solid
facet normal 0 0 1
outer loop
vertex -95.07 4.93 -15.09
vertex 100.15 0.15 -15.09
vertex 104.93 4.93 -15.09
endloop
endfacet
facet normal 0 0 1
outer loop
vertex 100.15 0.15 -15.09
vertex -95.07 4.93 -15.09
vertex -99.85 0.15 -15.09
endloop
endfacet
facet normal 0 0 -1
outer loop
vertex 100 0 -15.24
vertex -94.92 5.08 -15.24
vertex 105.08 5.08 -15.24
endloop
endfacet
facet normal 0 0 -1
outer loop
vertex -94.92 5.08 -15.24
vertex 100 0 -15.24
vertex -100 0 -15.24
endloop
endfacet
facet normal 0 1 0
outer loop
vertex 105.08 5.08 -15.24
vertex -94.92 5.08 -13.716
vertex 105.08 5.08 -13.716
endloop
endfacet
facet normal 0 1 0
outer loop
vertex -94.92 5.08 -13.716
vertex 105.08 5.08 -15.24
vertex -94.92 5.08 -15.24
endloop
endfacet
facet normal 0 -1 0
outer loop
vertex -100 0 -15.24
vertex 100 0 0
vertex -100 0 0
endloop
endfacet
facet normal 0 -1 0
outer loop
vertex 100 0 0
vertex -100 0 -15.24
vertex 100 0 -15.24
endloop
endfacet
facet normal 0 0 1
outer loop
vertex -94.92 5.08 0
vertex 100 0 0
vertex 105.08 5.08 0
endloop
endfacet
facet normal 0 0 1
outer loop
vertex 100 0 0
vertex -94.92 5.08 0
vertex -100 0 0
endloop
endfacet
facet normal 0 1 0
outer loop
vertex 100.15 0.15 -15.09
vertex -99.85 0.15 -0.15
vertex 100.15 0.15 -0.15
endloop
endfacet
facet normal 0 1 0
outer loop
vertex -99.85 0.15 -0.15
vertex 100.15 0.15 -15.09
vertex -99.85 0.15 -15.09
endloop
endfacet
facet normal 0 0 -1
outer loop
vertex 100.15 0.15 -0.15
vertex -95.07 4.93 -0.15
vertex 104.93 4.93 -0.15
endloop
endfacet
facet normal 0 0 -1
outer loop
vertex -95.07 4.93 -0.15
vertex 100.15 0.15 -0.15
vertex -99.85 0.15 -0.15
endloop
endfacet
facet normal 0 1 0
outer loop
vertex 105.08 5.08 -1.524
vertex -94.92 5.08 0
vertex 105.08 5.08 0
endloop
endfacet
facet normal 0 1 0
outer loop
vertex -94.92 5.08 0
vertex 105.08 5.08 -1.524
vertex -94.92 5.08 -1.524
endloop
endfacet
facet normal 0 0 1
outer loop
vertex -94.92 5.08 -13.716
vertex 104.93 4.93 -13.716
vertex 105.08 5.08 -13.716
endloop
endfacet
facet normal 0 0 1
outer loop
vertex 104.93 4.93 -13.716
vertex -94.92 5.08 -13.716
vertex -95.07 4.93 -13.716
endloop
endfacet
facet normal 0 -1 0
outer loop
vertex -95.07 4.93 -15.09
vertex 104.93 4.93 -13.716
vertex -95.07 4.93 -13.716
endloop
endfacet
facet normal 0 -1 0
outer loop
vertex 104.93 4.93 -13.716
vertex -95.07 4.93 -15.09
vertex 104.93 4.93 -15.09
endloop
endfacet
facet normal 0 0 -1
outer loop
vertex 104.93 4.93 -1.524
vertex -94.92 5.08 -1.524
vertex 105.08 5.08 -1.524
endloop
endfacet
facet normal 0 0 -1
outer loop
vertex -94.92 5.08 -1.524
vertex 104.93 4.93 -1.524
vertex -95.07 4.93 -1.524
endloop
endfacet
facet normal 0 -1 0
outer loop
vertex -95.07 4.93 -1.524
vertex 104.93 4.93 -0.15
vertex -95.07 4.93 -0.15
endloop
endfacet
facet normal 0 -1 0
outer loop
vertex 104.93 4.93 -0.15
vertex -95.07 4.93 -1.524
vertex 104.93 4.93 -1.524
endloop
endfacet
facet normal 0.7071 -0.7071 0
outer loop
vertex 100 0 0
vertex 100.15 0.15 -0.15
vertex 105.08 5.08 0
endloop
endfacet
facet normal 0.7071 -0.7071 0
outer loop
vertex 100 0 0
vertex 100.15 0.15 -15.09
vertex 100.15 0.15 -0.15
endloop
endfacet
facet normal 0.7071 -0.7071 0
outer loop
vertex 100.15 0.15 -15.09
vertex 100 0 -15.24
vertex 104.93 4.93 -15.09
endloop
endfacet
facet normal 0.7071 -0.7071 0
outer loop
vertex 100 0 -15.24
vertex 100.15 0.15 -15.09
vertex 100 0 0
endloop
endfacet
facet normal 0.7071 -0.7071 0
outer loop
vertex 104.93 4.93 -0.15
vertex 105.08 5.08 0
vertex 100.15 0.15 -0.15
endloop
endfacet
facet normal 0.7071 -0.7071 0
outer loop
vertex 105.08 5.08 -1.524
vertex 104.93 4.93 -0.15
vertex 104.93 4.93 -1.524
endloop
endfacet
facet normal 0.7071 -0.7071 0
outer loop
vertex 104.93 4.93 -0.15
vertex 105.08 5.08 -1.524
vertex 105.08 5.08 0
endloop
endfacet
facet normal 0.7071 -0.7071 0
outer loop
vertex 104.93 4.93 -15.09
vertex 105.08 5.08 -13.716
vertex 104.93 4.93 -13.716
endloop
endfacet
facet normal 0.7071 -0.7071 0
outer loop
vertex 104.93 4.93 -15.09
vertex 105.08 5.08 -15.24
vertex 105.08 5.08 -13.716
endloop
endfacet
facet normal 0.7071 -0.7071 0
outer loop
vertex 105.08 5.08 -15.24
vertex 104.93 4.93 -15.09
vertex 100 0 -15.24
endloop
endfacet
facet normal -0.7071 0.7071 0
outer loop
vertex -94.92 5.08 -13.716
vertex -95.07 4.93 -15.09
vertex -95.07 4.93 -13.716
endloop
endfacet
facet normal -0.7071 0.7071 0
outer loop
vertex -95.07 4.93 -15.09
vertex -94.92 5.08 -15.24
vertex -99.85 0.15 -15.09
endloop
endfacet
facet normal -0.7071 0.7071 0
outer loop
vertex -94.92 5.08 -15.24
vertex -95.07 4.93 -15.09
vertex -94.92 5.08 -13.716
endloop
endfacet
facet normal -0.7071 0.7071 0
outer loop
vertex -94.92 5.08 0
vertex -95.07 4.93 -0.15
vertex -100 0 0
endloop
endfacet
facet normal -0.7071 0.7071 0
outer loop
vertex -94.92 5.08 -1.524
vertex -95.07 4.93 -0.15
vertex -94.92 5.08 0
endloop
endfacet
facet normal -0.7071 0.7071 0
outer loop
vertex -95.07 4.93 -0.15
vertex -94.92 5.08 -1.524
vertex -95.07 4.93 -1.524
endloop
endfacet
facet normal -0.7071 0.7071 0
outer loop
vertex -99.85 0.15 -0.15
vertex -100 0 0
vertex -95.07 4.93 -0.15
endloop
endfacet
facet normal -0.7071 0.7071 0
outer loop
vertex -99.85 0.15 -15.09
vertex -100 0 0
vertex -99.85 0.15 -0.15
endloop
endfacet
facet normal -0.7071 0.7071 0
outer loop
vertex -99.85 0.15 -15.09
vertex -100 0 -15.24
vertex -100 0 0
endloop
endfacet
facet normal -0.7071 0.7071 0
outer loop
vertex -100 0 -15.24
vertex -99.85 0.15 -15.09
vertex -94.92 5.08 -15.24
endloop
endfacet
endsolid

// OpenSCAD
module anglebar(length=100, c = "DimGray", width=1.5*2.54, thickn=0.4) 
{
    color(c) {
        translate([0,width/2,thickn/2]) 
            cube([length, width, thickn], center = true);
        translate([0,thickn/2,width/2]) 
            cube([length, thickn, width], center = true);
    }
}

module anglebar1(length=100, c = "DimGray", thickn=0.3)
{
    anglebar(length, c, 2.54, thickn);
}

module anglebar15(length=100, c = "DimGray", thickn=0.4)
{
    anglebar(length, c, 1.5*2.54, thickn);
}

module anglebar2(length=100, c = "DimGray", thickn=0.5)
{
    anglebar(length, c, 2*2.54, thickn);
}

// Name is C-Channel, even I used C-bar.
// Channel Bar: 75mm x 50mm x 3mm, 6 m piece 1500-1700 pesos.
// Channel Bar: 75mm x 50mm x 5mm, 6 m piece 2260 pesos.
// Bigger sizes available.
module c_bar(length=100, c = "DarkGray", width=2.0*2.54, height = 3*2.54,thickn=0.5) 
{
    color(c) {
        translate([0,width/2,-height/2+thickn/2]) 
            cube([length, width, thickn], center = true);
        translate([0,thickn/2,0]) 
            cube([length, thickn, height], center = true);
        translate([0, width/2,height/2 - thickn/2]) 
            cube([length, width, thickn], center = true);
    }
}

module c_bar3(length=100, c = "DarkGray", thickn=0.5) 
{
    c_bar(length, c, 5, 7.5, thickn);
} 

// Purlin with cuts for 45 degrees and roof angle
module c_purlin_angled(
    length=100, 
    left_45 = 0, left_roof_angle = 0, 
    right_45 = 0, right_roof_angle = 0, 
    c = "Red", 
    width=2.0*2.54, height = 6*2.54,
    thickn=0.15) 
{
    add_len_left = height * tan(left_roof_angle);
    add_len_right = height * tan(right_roof_angle);
    add_len_tmp = add_len_left > add_len_right
        ? add_len_left : add_len_right;
    add_len_tmp2 = add_len_tmp < 0 ? 0 : add_len_tmp; 
    add_len = ((left_45 < 0 || right_45 < 0) 
        && add_len_tmp2 < width) 
        ? width : add_len_tmp2;
    
    box_d = height * sqrt(2);
    box_w = 4*width  + 0.2;
       
    difference()
    {
        translate([0,0,-height/2])
        c_purlin(length + 2*add_len, c, width, height, thickn);

        translate([length/2, 0, 0])
        rotate([0, -right_roof_angle, 0])
        rotate([0, 0, right_45])
        translate([box_d/2, width/2, -height/2])
        cube([box_d, box_w, box_d], center=true);

        translate([-length/2, 0, 0])
        rotate([0, left_roof_angle, 0])
        rotate([0, 0, -left_45])
        translate([-box_d/2, width/2, -height/2])
        cube([box_d, box_w, box_d], center=true);
    }
}

// C purlins come as 2"x3", 2"x4", 2"x6" and 2"x7", 
// 6m long pieces. Metric sizes also available.
// Steel thicknessess 1.2mm, 1.5mm or 2.0mm.
// 1.5mm price is good (2"x3" lists 574 pesos), 
// 1.2mm is not much cheaper and 2.0mm is expensive.
module c_purlin(length=100, c = "DarkGray", width=2*2.54, height = 3*2.54,thickn=0.15) 
{
    elbow = height/10;
    color(c) {
        translate([0,width/2,-height/2+thickn/2]) 
            cube([length, width, thickn], center = true);
        translate([0,thickn/2,0]) 
            cube([length, thickn, height], center = true);
        translate([0, width/2,height/2 - thickn/2]) 
            cube([length, width, thickn], center = true);

        translate([0,width-thickn/2,-height/2+elbow/2]) 
            cube([length, thickn, elbow], center = true);

        translate([0,width-thickn/2,height/2-elbow/2]) 
            cube([length, thickn, elbow], center = true);
    }
}

module c_purlin3(length=100, c = "DarkGray", thickn=0.15) 
{
    c_purlin(length, c, 2*2.54, 3*2.54,thickn); 
}

module c_purlin6(length=100, c = [17/255, 112/255, 83/255,1], thickn=0.15) 
{
    c_purlin(length, c, 2*2.54, 6*2.54,thickn); 
}

// Purlin with cuts for 45 degrees and roof angle
module c_purlin6_angled(
    length=100, 
    left_45 = false, left_roof_angle = 0, 
    right_45 = false, right_roof_angle = 0, 
    c = [19/255, 52/255, 27/255,0.8]) 
{
    c_purlin_angled(length, 
        left_45, left_roof_angle, 
        right_45, right_roof_angle, 
        c, 
        2.0*2.54, 6*2.54, 0.15); 
}

module roof_turn(length=100, bend_r = 2, alpha=25, thickn=0.06) 
{
    move_y = bend_r * sin(alpha);
   
    rotate([90,0,0])
    difference() {
        translate([0,-move_y,0]) 
        cylinder(h = length, r = bend_r, $fn=16);
        
        translate([0,-move_y,-0.5]) 
        cylinder(h = length+1, r = bend_r-thickn, $fn=16);
        
        cube_sz = 2*bend_r + 0.2;
        translate([0,-cube_sz/2-0.05,length/2]) 
        cube([cube_sz, cube_sz, length + 0.5], center = true);
    }
}

module roof_slice(length=100, r = 2,alpha=20, thickn=0.06) 
{
    bend_r = r/cos(alpha);
    move_y = bend_r * (1-sin(alpha));
    
    translate([-r, 0, move_y]) 
       roof_turn(length, bend_r, alpha, thickn); 

    translate([r, 0, move_y]) 
    rotate([0,180,0])
       roof_turn(length, bend_r, alpha, thickn); 
}

module roof_piece(length=300, width=105, c = "DarkGreen") 
{
    r = 3*2.54/4;
    alpha = 45;
    n = ceil(width/(4*r));
    color(c)
    intersection() {
        union() {
            for (i = [0:n-1]) {
                x = i * 4 * r;
                translate([x-width/2,length,0])
                roof_slice(length, r, alpha);
            }
        }
        
        cube_h = 2*r;
        translate([0,length/2,cube_h/2]) 
        cube([width, length, cube_h], center = true);
    }
}

c_purlin6_angled(
    length=200, 
    left_45 = 45, left_roof_angle = 0, 
    right_45 = -45, right_roof_angle = 0);
